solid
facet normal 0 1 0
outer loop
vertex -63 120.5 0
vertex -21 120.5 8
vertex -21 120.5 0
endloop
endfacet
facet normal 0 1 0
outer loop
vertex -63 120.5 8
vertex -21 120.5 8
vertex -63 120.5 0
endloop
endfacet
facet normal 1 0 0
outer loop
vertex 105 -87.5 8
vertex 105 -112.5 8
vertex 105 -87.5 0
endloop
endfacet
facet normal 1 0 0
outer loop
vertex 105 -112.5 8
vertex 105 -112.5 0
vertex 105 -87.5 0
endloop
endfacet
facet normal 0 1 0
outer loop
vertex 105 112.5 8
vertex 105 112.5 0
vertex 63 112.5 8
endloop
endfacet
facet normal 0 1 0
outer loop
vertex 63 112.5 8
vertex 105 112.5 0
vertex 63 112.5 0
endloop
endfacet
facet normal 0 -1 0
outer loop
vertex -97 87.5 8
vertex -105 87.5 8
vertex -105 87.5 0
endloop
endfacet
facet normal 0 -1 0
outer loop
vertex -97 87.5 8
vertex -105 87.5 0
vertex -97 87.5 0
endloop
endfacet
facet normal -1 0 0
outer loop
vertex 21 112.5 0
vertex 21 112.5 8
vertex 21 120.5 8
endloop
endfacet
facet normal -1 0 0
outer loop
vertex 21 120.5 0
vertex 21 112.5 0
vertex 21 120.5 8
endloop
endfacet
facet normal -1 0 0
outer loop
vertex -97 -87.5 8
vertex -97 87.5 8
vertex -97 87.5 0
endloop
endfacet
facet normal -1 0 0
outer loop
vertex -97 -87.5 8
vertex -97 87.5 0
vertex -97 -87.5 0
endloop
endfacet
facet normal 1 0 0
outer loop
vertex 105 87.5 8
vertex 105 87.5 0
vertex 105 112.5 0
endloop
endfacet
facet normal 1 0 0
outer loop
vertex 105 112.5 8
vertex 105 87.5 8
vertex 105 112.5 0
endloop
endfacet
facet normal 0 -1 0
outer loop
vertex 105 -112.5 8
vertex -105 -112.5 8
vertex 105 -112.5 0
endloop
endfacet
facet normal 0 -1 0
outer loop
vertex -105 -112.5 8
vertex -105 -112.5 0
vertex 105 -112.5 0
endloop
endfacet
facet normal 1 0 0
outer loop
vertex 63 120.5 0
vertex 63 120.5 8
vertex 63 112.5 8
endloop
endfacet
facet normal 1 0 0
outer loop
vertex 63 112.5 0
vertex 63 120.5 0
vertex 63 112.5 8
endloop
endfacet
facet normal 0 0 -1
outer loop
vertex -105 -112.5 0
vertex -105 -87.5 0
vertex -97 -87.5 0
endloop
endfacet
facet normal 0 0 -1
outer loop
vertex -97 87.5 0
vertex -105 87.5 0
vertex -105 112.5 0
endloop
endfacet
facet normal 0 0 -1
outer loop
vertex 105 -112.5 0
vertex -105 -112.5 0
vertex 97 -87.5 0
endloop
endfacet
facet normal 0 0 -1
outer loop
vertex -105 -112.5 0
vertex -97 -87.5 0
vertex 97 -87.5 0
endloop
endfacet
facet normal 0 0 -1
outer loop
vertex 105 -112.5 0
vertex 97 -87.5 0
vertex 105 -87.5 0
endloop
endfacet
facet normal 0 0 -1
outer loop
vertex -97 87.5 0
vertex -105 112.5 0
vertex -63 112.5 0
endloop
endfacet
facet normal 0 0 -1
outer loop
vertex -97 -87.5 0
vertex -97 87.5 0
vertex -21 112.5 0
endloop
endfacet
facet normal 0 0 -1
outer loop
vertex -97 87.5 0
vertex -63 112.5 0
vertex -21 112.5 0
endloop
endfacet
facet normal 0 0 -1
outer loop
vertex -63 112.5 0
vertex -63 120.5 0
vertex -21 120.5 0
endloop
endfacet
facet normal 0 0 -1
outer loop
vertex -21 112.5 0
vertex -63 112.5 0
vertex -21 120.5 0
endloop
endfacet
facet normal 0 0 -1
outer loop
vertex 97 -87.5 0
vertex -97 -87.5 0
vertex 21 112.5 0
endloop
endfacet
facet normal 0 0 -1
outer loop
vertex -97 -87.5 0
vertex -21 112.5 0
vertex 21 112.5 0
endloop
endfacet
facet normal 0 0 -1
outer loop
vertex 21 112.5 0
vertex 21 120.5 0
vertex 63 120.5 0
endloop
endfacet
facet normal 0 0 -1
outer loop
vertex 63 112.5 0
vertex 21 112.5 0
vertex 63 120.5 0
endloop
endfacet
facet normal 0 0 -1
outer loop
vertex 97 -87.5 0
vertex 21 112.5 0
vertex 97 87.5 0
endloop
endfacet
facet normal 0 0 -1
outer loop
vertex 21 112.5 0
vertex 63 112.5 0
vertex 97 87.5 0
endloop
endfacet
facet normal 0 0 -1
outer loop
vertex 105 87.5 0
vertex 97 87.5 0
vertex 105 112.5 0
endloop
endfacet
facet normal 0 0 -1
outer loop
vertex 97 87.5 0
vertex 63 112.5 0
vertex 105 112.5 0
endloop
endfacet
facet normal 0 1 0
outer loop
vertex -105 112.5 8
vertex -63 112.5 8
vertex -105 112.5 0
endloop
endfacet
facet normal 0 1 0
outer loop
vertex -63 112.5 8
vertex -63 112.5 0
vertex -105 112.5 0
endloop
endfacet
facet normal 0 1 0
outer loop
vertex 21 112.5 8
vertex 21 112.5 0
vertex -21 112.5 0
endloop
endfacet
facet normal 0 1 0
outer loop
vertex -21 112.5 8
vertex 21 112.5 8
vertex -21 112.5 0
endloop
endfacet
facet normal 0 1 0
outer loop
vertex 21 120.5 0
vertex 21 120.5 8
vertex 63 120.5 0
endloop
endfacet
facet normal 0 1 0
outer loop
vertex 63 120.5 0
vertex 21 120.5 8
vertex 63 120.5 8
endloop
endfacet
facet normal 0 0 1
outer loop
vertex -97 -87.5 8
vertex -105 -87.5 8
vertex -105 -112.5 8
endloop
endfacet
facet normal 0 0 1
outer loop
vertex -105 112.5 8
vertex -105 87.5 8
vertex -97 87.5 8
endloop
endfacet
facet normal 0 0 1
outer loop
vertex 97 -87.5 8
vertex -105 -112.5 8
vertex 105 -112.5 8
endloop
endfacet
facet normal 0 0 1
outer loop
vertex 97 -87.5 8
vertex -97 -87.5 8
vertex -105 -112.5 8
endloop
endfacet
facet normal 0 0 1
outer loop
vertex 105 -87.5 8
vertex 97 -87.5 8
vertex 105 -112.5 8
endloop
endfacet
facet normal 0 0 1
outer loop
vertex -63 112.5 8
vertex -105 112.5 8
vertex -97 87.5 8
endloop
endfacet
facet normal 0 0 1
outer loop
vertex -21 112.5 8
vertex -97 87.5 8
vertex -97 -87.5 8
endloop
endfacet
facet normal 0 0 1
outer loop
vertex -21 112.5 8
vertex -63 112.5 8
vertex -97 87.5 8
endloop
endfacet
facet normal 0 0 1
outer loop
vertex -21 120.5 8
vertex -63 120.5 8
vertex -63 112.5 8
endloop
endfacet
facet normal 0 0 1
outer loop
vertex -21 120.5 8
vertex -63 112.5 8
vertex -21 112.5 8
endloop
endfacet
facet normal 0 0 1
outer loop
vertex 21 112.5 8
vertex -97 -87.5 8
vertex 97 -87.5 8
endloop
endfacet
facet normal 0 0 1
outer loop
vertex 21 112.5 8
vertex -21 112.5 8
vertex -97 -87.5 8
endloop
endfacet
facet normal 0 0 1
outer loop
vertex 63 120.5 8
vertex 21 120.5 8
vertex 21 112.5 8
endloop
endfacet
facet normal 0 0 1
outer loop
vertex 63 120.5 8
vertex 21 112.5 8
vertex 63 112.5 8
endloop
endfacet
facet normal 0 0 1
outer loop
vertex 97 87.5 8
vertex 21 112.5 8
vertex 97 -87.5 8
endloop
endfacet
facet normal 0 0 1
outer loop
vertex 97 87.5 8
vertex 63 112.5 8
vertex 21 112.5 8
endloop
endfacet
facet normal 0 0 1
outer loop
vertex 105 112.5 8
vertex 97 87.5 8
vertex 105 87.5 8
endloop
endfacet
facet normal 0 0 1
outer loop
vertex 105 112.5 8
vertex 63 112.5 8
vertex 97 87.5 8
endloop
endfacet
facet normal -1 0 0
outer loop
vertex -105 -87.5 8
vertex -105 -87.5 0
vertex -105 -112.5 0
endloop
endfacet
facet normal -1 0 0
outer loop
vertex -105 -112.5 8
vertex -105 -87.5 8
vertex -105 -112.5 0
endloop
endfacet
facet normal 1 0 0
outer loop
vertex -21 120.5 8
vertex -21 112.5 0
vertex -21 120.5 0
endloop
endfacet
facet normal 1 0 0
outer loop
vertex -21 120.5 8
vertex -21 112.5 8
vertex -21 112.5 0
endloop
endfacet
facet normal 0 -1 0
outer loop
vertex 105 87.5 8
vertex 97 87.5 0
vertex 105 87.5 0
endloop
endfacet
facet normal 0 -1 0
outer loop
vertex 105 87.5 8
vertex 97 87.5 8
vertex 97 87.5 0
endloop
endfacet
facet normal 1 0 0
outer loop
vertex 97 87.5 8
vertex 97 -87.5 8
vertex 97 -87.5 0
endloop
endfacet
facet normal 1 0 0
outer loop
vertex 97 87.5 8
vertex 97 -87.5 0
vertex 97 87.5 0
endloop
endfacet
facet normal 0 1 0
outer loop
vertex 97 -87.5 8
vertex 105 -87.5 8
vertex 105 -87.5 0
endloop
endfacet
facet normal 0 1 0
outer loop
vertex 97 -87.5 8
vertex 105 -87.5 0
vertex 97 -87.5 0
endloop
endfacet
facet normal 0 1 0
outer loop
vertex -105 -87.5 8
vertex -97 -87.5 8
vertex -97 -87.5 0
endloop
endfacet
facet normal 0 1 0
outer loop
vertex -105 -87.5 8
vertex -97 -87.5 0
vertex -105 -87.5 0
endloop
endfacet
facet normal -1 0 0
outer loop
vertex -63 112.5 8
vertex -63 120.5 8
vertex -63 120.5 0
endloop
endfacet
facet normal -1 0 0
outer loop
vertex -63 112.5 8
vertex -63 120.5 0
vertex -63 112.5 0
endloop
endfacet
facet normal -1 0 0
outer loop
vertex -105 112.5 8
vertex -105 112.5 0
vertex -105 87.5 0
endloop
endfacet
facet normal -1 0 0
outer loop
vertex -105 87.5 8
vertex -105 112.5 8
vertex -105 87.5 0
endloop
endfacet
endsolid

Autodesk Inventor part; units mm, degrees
ref_plane "YZ Plane" through (0, 0, 0) normal (1, 0, 0) x (0, 1, 0)
ref_plane "XZ Plane" through (0, 0, 0) normal (0, 1, 0) x (-1, 0, 0)
ref_plane "XY Plane" through (0, 0, 0) normal (0, 0, 1) x (1, 0, 0)
sketch "Sketch2" plane through (0, 0, 0) normal (0, 0, 1) x (1, 0, 0)
  line L0 (-105, -112.5) -> (105, -112.5)
  line L1 (105, -112.5) -> (105, 112.5)
  line L2 (105, 112.5) -> (-105, 112.5)
  line L3 (-105, 112.5) -> (-105, -112.5)
  line L4 (-105, -112.5) -> (105, 112.5) construction
  line L5 (105, -112.5) -> (-105, 112.5) construction
  point P0 (0, 0)
  dimension "d11" = 225
  dimension "d12" = 210
extrude "Extrusion2" add sketch "Sketch2" along normal blind 8
sketch "Sketch3" plane through (0, 0, 8) normal (0, 0, 1) x (1, 0, 0)
  line L0 (105, 112.5) -> (-105, 112.5) projected
  line L1 (-63, 112.5) -> (-21, 112.5)
  line L2 (-21, 112.5) -> (-21, 120.5)
  line L3 (-21, 120.5) -> (-63, 120.5)
  line L4 (-63, 120.5) -> (-63, 112.5)
  line L5 (63, 112.5) -> (21, 112.5)
  line L6 (21, 112.5) -> (21, 120.5)
  line L7 (21, 120.5) -> (63, 120.5)
  line L8 (63, 120.5) -> (63, 112.5)
  line L9 (-21, 120.5) -> (21, 120.5) construction
  line L10 (63, 120.5) -> (105, 120.5) construction
  line L11 (-63, 120.5) -> (-105, 120.5) construction
  point P0 (0, 0)
  dimension "d15" = 8
extrude "Extrusion3" add sketch "Sketch3" against normal blind 8
sketch "Sketch4" plane through (0, 0, 8) normal (0, 0, 1) x (1, 0, 0)
  line L0 (-105, 112.5) -> (-105, -112.5) projected
  line L1 (-105, 87.5) -> (-97, 87.5)
  line L2 (-97, 87.5) -> (-97, -87.5)
  line L3 (-97, -87.5) -> (-105, -87.5)
  line L4 (-105, -87.5) -> (-105, 87.5)
  line L5 (-97, 87.5) -> (-97, 112.5) construction
  line L6 (-97, -87.5) -> (-97, -112.5) construction
  point P0 (0, 0)
  dimension "d20" = 8
  dimension "d21" = 25
extrude "Extrusion4" cut sketch "Sketch4" against normal blind 8
mirror "Mirror2" about plane through (0, 0, 0) normal (1, 0, 0) of "Extrusion4"
properties part number "M06 - Wall Side 1" material "Polycarbonate, Clear"
